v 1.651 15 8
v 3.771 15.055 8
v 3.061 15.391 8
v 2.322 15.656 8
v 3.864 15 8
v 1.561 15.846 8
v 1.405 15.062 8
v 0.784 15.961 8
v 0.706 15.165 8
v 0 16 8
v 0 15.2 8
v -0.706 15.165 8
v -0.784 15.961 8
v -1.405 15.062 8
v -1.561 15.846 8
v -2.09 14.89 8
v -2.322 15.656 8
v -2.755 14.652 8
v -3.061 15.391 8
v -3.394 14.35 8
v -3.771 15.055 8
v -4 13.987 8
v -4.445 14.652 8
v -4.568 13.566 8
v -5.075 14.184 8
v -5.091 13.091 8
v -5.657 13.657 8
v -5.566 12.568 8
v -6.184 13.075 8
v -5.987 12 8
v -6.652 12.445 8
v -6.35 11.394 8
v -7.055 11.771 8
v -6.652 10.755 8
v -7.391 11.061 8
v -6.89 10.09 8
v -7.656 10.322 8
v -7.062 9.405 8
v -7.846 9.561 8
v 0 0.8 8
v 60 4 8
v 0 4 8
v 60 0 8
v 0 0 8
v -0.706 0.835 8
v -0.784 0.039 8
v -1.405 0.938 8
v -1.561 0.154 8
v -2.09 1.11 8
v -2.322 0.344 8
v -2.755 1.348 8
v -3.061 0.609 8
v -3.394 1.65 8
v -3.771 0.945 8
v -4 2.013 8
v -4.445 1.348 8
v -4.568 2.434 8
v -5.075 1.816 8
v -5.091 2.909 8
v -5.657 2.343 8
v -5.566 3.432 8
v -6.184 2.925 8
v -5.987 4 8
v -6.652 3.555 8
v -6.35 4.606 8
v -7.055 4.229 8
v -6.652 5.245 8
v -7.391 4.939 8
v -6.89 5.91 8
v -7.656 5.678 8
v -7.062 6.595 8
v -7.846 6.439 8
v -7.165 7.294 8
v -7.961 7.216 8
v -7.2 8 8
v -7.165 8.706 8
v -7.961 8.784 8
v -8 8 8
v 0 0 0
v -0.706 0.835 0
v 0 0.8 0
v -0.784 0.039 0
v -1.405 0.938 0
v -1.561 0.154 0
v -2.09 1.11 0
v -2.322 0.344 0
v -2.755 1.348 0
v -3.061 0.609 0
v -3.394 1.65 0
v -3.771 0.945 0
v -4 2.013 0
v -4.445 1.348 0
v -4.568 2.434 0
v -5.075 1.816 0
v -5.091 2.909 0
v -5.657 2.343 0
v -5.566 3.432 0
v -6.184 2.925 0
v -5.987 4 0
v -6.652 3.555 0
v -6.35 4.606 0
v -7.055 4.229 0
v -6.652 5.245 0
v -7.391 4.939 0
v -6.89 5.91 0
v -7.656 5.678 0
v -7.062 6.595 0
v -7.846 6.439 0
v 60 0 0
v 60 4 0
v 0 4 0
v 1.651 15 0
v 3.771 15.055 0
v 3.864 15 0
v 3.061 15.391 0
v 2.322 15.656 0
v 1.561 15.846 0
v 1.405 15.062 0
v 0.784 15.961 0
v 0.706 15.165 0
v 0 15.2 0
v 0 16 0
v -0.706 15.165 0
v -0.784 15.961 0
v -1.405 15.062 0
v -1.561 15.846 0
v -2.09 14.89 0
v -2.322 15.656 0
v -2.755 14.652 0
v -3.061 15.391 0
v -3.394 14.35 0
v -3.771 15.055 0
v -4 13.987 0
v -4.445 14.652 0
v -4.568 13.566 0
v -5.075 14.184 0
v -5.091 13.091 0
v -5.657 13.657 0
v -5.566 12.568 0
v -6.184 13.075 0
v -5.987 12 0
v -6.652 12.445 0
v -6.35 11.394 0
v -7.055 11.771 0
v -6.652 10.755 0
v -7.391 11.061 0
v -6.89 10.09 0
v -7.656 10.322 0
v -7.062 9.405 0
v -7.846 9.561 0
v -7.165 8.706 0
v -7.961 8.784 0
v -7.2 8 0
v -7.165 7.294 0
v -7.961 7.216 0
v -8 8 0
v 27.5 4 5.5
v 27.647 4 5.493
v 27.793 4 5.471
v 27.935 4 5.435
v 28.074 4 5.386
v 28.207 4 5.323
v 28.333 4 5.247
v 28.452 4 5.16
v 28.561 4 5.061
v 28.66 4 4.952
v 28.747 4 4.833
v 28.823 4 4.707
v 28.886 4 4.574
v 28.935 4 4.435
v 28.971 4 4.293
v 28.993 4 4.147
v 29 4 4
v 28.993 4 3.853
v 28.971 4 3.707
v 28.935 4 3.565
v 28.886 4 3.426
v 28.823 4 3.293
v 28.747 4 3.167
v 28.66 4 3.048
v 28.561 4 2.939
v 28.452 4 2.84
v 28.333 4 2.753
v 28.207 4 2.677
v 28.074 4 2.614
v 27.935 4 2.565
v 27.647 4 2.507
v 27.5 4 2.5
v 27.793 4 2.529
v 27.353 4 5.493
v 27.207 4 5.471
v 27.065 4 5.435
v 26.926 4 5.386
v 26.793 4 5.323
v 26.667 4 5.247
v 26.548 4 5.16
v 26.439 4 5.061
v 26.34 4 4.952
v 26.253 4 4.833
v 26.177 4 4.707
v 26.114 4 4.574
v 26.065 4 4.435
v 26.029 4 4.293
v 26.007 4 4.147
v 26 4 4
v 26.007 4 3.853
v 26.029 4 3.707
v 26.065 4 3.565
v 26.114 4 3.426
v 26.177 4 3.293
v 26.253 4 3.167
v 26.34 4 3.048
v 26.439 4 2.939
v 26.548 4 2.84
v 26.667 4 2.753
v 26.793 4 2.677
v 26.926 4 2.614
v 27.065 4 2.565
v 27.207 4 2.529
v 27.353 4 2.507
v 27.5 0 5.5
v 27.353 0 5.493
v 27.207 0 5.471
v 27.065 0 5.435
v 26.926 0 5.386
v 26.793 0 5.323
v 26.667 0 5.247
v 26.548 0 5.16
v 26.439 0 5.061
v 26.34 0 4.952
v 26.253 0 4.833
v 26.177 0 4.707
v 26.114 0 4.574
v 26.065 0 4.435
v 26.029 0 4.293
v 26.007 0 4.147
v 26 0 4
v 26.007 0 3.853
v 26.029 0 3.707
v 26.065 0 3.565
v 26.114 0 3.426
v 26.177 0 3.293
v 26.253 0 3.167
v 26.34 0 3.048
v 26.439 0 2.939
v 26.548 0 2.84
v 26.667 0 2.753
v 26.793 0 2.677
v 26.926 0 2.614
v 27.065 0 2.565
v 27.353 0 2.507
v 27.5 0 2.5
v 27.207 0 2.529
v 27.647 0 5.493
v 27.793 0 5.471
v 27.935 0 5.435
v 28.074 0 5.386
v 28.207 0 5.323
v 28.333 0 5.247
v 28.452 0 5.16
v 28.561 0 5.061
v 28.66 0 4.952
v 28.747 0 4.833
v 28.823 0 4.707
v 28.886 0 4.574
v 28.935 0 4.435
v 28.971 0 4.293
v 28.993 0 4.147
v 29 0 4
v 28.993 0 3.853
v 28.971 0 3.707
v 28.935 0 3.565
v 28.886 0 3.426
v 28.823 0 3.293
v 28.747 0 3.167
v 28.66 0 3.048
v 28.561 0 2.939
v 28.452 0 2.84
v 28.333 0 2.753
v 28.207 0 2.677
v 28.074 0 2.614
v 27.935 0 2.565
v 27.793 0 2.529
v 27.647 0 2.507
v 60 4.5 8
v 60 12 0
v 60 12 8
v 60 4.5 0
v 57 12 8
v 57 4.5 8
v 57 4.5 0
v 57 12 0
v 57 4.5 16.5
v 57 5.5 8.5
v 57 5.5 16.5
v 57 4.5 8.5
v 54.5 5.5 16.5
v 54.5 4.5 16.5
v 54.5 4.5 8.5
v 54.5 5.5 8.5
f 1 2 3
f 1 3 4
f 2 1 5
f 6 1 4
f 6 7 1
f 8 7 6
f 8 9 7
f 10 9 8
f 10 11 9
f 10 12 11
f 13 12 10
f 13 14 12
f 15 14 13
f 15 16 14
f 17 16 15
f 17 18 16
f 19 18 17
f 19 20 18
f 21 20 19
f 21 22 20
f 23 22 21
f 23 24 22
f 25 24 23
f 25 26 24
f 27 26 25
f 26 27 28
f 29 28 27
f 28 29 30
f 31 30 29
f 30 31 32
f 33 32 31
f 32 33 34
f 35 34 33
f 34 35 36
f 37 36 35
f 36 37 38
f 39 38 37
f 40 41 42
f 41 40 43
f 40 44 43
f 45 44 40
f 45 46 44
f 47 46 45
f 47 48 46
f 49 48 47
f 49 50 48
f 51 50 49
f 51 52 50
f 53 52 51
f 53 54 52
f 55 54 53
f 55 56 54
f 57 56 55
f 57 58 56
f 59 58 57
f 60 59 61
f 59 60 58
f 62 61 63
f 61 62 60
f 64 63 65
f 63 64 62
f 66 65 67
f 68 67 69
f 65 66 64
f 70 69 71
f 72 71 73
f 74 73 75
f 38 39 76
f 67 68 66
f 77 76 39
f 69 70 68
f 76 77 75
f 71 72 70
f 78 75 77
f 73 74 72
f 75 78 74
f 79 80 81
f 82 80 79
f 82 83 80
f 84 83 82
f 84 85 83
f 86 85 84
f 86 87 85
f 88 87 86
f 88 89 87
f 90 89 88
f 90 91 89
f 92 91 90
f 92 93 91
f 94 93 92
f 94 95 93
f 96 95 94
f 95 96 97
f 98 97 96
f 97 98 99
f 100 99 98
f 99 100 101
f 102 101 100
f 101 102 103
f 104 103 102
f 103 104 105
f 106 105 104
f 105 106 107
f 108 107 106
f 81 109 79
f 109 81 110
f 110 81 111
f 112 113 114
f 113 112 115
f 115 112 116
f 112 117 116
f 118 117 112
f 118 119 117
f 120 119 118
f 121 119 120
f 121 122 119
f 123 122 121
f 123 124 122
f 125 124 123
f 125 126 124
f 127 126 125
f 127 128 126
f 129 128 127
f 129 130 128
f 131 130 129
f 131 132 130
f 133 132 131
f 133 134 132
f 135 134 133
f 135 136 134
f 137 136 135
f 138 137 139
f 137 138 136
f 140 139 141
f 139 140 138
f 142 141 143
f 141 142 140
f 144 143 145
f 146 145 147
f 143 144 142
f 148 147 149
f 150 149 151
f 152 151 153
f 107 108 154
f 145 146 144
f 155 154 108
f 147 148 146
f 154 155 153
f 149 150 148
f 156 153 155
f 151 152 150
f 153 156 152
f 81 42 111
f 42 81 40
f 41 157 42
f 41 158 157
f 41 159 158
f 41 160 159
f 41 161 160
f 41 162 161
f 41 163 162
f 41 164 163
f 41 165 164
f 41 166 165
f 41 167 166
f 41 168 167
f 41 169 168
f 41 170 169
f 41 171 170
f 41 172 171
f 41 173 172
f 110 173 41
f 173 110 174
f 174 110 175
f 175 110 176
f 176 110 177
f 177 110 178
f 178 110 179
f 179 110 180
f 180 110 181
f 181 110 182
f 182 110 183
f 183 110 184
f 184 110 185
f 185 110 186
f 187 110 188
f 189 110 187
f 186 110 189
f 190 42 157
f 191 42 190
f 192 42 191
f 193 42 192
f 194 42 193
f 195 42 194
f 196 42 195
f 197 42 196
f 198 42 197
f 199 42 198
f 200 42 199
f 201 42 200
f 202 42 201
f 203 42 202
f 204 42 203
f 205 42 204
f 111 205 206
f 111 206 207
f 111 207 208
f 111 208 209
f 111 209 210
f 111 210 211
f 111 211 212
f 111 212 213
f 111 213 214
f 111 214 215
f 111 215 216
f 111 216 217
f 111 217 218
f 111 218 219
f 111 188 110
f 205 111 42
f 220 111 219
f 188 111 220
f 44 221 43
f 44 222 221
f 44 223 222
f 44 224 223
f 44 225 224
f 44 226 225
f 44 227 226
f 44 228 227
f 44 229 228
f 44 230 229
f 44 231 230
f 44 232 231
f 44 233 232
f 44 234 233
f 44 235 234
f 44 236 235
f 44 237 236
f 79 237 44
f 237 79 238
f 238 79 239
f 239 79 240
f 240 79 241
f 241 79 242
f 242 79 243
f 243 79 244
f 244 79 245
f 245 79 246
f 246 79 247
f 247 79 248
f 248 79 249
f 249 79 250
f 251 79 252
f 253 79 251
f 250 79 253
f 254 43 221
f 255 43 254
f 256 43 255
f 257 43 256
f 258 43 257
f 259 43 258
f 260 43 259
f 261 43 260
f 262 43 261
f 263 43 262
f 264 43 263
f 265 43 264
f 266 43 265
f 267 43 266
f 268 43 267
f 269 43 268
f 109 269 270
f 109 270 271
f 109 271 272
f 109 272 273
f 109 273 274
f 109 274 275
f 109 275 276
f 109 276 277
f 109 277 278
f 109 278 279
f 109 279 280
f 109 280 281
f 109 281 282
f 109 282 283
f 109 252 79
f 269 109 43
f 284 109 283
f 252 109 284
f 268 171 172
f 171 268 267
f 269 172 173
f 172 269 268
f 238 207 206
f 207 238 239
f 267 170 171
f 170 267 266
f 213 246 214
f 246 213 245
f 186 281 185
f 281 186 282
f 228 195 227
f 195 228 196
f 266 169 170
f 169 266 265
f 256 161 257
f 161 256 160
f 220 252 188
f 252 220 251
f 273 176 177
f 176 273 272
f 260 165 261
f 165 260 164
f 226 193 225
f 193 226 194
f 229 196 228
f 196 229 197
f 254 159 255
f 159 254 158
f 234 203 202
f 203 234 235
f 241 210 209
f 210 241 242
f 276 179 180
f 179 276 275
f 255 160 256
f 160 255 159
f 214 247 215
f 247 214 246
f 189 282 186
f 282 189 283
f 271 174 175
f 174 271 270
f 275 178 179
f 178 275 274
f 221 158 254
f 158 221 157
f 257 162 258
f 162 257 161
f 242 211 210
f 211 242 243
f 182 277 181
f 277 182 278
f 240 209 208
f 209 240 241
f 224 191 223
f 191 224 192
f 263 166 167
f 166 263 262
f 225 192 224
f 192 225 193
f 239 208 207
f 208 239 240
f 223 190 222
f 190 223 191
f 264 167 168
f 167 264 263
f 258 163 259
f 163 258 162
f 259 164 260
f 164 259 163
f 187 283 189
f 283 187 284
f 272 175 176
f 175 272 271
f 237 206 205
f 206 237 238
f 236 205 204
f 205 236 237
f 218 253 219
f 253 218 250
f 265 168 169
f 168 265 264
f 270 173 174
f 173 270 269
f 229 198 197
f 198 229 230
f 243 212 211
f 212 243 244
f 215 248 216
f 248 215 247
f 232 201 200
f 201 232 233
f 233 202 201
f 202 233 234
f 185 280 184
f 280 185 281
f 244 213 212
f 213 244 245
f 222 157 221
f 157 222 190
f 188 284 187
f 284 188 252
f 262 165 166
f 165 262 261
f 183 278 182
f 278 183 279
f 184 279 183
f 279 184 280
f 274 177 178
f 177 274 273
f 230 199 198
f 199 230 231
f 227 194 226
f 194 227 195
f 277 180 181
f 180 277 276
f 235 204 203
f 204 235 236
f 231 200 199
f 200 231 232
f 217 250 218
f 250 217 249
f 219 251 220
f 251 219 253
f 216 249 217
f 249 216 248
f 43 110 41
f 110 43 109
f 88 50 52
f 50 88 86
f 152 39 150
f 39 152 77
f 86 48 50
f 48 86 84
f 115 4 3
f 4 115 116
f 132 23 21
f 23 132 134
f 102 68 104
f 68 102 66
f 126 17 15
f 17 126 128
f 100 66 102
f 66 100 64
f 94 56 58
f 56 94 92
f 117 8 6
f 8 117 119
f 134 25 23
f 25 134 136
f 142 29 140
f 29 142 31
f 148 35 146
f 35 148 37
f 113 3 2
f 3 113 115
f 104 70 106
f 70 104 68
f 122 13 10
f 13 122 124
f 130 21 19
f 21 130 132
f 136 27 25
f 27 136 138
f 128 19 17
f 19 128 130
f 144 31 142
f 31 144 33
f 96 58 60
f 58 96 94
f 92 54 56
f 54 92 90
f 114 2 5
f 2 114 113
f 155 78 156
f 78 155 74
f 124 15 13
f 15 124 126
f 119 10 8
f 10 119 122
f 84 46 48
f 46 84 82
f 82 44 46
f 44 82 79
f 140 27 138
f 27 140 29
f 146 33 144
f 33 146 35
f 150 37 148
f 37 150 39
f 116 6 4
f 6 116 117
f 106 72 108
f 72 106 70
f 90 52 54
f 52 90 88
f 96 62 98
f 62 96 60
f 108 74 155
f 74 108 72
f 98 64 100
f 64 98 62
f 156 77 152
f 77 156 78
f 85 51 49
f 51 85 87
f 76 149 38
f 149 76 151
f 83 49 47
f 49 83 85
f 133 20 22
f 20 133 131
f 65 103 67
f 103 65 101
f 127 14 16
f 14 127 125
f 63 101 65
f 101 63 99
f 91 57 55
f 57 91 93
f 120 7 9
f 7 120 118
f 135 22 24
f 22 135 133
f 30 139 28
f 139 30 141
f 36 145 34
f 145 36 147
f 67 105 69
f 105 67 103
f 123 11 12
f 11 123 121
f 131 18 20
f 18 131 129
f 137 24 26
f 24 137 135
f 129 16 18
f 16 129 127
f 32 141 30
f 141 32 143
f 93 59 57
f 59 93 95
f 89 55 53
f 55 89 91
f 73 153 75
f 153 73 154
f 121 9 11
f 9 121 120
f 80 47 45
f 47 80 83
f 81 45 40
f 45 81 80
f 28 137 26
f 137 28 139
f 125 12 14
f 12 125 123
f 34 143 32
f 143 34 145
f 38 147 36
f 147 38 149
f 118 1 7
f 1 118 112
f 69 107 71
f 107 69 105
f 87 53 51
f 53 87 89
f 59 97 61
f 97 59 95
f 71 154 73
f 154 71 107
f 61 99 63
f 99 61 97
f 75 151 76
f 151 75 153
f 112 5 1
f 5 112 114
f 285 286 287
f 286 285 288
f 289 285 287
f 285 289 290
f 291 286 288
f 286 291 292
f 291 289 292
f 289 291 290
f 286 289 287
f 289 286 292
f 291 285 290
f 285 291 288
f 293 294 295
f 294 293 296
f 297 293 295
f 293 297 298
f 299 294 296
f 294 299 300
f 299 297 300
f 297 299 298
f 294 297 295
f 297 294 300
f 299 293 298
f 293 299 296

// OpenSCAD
// --- Dimensions ---
// Lower Jaw
jaw_lower_len = 50;          // Length of main lower bar
jaw_lower_width = 4;         // Width of main lower bar
tongue_len = 6;              // Length of the tongue part
tongue_start_x = 50;         // X position where tongue starts
tongue_y_min = 2.5;          // Y position of tongue bottom
tongue_y_max = 4;            // Y position of tongue top

// Upper Jaw
jaw_upper_len = 60;          // Length of upper bar
jaw_upper_y_min = 12;        // Y position of upper bar bottom
jaw_upper_y_max = 16;        // Y position of upper bar top

// Hinge (Half-ring)
hinge_center_x = 0;          // X center of hinge
hinge_center_y = 8;          // Y center of hinge
hinge_r_inner = 7.2;         // Inner radius of hinge
hinge_r_outer = 8.0;         // Outer radius of hinge

// Pinch Ridges
ridge_radius = 1.5;          // Radius of the half-round ridge
ridge_x_pos = 27.5;          // X position of the ridge

// Latch
latch_leg_x_min = 57;         // X start of latch leg
latch_leg_x_max = 60;         // X end of latch leg
latch_leg_y_min = 4.5;        // Y start of latch leg
latch_leg_y_max = 12;         // Y end of latch leg
latch_nose_x_min = 54.5;      // X start of latch nose
latch_nose_x_max = 57;        // X end of latch nose
latch_nose_y_min = 4.5;       // Y start of latch nose
latch_nose_y_max = 5.5;       // Y end of latch nose
latch_offset_z = 0.5;        // Z offset for the nose relative to tongue

// General
thickness = 8;               // Extrusion depth (Z)
$fn = 64;                    // Smoothness

// --- Construction ---

module pinch_clamp() {
    union() {
        // 1. Lower Jaw (Main Bar + Tongue)
        difference() {
            union() {
                // Main bar
                cube([jaw_lower_len, jaw_lower_width, thickness]);
                // Tongue
                translate([tongue_start_x, tongue_y_min, 0])
                    cube([tongue_len, tongue_y_max - tongue_y_min, thickness]);
            }
            
            // Lower Ridge Cutout (Half-round)
            translate([ridge_x_pos, 0, thickness/2])
                rotate([90, 0, 0])
                    cylinder(r = ridge_radius, h = jaw_lower_len + 2, center = true);
        }

        // 2. Upper Jaw
        difference() {
            cube([jaw_upper_len, jaw_upper_y_max - jaw_upper_y_min, thickness]);
            
            // Upper Ridge Cutout (Half-round)
            translate([ridge_x_pos, jaw_upper_y_min, thickness/2])
                rotate([90, 0, 0])
                    cylinder(r = ridge_radius, h = jaw_upper_len + 2, center = true);
        }

        // 3. Hinge (Half-ring)
        // We create a full ring and subtract the right half to ensure a clean vertical cut at x=0
        difference() {
            // Outer ring
            translate([hinge_center_x, hinge_center_y, 0])
                cylinder(r = hinge_r_outer, h = thickness);
            // Inner ring
            translate([hinge_center_x, hinge_center_y, -1])
                cylinder(r = hinge_r_inner, h = thickness + 2);
            // Cut the right half to make it a half-ring on the left side
            translate([hinge_center_x, hinge_center_y - hinge_r_outer - 1, -1])
                cube([hinge_r_outer * 2 + 2, hinge_r_outer * 2, thickness + 2]);
        }

        // 4. Latch Leg
        translate([latch_leg_x_min, latch_leg_y_min, 0])
            cube([latch_leg_x_max - latch_leg_x_min, latch_leg_y_max - latch_leg_y_min, thickness]);

        // 5. Latch Nose
        // The nose is 0.5mm above the tongue. Since the tongue is at Z=0 to 8, 
        // and the part is printed flat, we model the nose as a separate volume 
        // that is part of the upper jaw assembly.
        // Note: To make this a single solid for 3D printing, we use union.
        translate([latch_nose_x_min, latch_nose_y_min, thickness + latch_offset_z])
            cube([latch_nose_x_max - latch_nose_x_min, latch_nose_y_max - latch_nose_y_min, thickness]);
    }
}

// Render the part
// The part is centered on X/Y as requested, but the geometry is defined relative to origin.
// To center the whole bounding box, we'd need to calculate bounds, 
// but per instructions "centre it on the origin in X and Y" usually implies 
// the geometry is built around the origin. 
// Given the hinge is at x=0, we will translate the whole assembly so the hinge center is at 0,0.

translate([0, 0, 0])
    pinch_clamp();
